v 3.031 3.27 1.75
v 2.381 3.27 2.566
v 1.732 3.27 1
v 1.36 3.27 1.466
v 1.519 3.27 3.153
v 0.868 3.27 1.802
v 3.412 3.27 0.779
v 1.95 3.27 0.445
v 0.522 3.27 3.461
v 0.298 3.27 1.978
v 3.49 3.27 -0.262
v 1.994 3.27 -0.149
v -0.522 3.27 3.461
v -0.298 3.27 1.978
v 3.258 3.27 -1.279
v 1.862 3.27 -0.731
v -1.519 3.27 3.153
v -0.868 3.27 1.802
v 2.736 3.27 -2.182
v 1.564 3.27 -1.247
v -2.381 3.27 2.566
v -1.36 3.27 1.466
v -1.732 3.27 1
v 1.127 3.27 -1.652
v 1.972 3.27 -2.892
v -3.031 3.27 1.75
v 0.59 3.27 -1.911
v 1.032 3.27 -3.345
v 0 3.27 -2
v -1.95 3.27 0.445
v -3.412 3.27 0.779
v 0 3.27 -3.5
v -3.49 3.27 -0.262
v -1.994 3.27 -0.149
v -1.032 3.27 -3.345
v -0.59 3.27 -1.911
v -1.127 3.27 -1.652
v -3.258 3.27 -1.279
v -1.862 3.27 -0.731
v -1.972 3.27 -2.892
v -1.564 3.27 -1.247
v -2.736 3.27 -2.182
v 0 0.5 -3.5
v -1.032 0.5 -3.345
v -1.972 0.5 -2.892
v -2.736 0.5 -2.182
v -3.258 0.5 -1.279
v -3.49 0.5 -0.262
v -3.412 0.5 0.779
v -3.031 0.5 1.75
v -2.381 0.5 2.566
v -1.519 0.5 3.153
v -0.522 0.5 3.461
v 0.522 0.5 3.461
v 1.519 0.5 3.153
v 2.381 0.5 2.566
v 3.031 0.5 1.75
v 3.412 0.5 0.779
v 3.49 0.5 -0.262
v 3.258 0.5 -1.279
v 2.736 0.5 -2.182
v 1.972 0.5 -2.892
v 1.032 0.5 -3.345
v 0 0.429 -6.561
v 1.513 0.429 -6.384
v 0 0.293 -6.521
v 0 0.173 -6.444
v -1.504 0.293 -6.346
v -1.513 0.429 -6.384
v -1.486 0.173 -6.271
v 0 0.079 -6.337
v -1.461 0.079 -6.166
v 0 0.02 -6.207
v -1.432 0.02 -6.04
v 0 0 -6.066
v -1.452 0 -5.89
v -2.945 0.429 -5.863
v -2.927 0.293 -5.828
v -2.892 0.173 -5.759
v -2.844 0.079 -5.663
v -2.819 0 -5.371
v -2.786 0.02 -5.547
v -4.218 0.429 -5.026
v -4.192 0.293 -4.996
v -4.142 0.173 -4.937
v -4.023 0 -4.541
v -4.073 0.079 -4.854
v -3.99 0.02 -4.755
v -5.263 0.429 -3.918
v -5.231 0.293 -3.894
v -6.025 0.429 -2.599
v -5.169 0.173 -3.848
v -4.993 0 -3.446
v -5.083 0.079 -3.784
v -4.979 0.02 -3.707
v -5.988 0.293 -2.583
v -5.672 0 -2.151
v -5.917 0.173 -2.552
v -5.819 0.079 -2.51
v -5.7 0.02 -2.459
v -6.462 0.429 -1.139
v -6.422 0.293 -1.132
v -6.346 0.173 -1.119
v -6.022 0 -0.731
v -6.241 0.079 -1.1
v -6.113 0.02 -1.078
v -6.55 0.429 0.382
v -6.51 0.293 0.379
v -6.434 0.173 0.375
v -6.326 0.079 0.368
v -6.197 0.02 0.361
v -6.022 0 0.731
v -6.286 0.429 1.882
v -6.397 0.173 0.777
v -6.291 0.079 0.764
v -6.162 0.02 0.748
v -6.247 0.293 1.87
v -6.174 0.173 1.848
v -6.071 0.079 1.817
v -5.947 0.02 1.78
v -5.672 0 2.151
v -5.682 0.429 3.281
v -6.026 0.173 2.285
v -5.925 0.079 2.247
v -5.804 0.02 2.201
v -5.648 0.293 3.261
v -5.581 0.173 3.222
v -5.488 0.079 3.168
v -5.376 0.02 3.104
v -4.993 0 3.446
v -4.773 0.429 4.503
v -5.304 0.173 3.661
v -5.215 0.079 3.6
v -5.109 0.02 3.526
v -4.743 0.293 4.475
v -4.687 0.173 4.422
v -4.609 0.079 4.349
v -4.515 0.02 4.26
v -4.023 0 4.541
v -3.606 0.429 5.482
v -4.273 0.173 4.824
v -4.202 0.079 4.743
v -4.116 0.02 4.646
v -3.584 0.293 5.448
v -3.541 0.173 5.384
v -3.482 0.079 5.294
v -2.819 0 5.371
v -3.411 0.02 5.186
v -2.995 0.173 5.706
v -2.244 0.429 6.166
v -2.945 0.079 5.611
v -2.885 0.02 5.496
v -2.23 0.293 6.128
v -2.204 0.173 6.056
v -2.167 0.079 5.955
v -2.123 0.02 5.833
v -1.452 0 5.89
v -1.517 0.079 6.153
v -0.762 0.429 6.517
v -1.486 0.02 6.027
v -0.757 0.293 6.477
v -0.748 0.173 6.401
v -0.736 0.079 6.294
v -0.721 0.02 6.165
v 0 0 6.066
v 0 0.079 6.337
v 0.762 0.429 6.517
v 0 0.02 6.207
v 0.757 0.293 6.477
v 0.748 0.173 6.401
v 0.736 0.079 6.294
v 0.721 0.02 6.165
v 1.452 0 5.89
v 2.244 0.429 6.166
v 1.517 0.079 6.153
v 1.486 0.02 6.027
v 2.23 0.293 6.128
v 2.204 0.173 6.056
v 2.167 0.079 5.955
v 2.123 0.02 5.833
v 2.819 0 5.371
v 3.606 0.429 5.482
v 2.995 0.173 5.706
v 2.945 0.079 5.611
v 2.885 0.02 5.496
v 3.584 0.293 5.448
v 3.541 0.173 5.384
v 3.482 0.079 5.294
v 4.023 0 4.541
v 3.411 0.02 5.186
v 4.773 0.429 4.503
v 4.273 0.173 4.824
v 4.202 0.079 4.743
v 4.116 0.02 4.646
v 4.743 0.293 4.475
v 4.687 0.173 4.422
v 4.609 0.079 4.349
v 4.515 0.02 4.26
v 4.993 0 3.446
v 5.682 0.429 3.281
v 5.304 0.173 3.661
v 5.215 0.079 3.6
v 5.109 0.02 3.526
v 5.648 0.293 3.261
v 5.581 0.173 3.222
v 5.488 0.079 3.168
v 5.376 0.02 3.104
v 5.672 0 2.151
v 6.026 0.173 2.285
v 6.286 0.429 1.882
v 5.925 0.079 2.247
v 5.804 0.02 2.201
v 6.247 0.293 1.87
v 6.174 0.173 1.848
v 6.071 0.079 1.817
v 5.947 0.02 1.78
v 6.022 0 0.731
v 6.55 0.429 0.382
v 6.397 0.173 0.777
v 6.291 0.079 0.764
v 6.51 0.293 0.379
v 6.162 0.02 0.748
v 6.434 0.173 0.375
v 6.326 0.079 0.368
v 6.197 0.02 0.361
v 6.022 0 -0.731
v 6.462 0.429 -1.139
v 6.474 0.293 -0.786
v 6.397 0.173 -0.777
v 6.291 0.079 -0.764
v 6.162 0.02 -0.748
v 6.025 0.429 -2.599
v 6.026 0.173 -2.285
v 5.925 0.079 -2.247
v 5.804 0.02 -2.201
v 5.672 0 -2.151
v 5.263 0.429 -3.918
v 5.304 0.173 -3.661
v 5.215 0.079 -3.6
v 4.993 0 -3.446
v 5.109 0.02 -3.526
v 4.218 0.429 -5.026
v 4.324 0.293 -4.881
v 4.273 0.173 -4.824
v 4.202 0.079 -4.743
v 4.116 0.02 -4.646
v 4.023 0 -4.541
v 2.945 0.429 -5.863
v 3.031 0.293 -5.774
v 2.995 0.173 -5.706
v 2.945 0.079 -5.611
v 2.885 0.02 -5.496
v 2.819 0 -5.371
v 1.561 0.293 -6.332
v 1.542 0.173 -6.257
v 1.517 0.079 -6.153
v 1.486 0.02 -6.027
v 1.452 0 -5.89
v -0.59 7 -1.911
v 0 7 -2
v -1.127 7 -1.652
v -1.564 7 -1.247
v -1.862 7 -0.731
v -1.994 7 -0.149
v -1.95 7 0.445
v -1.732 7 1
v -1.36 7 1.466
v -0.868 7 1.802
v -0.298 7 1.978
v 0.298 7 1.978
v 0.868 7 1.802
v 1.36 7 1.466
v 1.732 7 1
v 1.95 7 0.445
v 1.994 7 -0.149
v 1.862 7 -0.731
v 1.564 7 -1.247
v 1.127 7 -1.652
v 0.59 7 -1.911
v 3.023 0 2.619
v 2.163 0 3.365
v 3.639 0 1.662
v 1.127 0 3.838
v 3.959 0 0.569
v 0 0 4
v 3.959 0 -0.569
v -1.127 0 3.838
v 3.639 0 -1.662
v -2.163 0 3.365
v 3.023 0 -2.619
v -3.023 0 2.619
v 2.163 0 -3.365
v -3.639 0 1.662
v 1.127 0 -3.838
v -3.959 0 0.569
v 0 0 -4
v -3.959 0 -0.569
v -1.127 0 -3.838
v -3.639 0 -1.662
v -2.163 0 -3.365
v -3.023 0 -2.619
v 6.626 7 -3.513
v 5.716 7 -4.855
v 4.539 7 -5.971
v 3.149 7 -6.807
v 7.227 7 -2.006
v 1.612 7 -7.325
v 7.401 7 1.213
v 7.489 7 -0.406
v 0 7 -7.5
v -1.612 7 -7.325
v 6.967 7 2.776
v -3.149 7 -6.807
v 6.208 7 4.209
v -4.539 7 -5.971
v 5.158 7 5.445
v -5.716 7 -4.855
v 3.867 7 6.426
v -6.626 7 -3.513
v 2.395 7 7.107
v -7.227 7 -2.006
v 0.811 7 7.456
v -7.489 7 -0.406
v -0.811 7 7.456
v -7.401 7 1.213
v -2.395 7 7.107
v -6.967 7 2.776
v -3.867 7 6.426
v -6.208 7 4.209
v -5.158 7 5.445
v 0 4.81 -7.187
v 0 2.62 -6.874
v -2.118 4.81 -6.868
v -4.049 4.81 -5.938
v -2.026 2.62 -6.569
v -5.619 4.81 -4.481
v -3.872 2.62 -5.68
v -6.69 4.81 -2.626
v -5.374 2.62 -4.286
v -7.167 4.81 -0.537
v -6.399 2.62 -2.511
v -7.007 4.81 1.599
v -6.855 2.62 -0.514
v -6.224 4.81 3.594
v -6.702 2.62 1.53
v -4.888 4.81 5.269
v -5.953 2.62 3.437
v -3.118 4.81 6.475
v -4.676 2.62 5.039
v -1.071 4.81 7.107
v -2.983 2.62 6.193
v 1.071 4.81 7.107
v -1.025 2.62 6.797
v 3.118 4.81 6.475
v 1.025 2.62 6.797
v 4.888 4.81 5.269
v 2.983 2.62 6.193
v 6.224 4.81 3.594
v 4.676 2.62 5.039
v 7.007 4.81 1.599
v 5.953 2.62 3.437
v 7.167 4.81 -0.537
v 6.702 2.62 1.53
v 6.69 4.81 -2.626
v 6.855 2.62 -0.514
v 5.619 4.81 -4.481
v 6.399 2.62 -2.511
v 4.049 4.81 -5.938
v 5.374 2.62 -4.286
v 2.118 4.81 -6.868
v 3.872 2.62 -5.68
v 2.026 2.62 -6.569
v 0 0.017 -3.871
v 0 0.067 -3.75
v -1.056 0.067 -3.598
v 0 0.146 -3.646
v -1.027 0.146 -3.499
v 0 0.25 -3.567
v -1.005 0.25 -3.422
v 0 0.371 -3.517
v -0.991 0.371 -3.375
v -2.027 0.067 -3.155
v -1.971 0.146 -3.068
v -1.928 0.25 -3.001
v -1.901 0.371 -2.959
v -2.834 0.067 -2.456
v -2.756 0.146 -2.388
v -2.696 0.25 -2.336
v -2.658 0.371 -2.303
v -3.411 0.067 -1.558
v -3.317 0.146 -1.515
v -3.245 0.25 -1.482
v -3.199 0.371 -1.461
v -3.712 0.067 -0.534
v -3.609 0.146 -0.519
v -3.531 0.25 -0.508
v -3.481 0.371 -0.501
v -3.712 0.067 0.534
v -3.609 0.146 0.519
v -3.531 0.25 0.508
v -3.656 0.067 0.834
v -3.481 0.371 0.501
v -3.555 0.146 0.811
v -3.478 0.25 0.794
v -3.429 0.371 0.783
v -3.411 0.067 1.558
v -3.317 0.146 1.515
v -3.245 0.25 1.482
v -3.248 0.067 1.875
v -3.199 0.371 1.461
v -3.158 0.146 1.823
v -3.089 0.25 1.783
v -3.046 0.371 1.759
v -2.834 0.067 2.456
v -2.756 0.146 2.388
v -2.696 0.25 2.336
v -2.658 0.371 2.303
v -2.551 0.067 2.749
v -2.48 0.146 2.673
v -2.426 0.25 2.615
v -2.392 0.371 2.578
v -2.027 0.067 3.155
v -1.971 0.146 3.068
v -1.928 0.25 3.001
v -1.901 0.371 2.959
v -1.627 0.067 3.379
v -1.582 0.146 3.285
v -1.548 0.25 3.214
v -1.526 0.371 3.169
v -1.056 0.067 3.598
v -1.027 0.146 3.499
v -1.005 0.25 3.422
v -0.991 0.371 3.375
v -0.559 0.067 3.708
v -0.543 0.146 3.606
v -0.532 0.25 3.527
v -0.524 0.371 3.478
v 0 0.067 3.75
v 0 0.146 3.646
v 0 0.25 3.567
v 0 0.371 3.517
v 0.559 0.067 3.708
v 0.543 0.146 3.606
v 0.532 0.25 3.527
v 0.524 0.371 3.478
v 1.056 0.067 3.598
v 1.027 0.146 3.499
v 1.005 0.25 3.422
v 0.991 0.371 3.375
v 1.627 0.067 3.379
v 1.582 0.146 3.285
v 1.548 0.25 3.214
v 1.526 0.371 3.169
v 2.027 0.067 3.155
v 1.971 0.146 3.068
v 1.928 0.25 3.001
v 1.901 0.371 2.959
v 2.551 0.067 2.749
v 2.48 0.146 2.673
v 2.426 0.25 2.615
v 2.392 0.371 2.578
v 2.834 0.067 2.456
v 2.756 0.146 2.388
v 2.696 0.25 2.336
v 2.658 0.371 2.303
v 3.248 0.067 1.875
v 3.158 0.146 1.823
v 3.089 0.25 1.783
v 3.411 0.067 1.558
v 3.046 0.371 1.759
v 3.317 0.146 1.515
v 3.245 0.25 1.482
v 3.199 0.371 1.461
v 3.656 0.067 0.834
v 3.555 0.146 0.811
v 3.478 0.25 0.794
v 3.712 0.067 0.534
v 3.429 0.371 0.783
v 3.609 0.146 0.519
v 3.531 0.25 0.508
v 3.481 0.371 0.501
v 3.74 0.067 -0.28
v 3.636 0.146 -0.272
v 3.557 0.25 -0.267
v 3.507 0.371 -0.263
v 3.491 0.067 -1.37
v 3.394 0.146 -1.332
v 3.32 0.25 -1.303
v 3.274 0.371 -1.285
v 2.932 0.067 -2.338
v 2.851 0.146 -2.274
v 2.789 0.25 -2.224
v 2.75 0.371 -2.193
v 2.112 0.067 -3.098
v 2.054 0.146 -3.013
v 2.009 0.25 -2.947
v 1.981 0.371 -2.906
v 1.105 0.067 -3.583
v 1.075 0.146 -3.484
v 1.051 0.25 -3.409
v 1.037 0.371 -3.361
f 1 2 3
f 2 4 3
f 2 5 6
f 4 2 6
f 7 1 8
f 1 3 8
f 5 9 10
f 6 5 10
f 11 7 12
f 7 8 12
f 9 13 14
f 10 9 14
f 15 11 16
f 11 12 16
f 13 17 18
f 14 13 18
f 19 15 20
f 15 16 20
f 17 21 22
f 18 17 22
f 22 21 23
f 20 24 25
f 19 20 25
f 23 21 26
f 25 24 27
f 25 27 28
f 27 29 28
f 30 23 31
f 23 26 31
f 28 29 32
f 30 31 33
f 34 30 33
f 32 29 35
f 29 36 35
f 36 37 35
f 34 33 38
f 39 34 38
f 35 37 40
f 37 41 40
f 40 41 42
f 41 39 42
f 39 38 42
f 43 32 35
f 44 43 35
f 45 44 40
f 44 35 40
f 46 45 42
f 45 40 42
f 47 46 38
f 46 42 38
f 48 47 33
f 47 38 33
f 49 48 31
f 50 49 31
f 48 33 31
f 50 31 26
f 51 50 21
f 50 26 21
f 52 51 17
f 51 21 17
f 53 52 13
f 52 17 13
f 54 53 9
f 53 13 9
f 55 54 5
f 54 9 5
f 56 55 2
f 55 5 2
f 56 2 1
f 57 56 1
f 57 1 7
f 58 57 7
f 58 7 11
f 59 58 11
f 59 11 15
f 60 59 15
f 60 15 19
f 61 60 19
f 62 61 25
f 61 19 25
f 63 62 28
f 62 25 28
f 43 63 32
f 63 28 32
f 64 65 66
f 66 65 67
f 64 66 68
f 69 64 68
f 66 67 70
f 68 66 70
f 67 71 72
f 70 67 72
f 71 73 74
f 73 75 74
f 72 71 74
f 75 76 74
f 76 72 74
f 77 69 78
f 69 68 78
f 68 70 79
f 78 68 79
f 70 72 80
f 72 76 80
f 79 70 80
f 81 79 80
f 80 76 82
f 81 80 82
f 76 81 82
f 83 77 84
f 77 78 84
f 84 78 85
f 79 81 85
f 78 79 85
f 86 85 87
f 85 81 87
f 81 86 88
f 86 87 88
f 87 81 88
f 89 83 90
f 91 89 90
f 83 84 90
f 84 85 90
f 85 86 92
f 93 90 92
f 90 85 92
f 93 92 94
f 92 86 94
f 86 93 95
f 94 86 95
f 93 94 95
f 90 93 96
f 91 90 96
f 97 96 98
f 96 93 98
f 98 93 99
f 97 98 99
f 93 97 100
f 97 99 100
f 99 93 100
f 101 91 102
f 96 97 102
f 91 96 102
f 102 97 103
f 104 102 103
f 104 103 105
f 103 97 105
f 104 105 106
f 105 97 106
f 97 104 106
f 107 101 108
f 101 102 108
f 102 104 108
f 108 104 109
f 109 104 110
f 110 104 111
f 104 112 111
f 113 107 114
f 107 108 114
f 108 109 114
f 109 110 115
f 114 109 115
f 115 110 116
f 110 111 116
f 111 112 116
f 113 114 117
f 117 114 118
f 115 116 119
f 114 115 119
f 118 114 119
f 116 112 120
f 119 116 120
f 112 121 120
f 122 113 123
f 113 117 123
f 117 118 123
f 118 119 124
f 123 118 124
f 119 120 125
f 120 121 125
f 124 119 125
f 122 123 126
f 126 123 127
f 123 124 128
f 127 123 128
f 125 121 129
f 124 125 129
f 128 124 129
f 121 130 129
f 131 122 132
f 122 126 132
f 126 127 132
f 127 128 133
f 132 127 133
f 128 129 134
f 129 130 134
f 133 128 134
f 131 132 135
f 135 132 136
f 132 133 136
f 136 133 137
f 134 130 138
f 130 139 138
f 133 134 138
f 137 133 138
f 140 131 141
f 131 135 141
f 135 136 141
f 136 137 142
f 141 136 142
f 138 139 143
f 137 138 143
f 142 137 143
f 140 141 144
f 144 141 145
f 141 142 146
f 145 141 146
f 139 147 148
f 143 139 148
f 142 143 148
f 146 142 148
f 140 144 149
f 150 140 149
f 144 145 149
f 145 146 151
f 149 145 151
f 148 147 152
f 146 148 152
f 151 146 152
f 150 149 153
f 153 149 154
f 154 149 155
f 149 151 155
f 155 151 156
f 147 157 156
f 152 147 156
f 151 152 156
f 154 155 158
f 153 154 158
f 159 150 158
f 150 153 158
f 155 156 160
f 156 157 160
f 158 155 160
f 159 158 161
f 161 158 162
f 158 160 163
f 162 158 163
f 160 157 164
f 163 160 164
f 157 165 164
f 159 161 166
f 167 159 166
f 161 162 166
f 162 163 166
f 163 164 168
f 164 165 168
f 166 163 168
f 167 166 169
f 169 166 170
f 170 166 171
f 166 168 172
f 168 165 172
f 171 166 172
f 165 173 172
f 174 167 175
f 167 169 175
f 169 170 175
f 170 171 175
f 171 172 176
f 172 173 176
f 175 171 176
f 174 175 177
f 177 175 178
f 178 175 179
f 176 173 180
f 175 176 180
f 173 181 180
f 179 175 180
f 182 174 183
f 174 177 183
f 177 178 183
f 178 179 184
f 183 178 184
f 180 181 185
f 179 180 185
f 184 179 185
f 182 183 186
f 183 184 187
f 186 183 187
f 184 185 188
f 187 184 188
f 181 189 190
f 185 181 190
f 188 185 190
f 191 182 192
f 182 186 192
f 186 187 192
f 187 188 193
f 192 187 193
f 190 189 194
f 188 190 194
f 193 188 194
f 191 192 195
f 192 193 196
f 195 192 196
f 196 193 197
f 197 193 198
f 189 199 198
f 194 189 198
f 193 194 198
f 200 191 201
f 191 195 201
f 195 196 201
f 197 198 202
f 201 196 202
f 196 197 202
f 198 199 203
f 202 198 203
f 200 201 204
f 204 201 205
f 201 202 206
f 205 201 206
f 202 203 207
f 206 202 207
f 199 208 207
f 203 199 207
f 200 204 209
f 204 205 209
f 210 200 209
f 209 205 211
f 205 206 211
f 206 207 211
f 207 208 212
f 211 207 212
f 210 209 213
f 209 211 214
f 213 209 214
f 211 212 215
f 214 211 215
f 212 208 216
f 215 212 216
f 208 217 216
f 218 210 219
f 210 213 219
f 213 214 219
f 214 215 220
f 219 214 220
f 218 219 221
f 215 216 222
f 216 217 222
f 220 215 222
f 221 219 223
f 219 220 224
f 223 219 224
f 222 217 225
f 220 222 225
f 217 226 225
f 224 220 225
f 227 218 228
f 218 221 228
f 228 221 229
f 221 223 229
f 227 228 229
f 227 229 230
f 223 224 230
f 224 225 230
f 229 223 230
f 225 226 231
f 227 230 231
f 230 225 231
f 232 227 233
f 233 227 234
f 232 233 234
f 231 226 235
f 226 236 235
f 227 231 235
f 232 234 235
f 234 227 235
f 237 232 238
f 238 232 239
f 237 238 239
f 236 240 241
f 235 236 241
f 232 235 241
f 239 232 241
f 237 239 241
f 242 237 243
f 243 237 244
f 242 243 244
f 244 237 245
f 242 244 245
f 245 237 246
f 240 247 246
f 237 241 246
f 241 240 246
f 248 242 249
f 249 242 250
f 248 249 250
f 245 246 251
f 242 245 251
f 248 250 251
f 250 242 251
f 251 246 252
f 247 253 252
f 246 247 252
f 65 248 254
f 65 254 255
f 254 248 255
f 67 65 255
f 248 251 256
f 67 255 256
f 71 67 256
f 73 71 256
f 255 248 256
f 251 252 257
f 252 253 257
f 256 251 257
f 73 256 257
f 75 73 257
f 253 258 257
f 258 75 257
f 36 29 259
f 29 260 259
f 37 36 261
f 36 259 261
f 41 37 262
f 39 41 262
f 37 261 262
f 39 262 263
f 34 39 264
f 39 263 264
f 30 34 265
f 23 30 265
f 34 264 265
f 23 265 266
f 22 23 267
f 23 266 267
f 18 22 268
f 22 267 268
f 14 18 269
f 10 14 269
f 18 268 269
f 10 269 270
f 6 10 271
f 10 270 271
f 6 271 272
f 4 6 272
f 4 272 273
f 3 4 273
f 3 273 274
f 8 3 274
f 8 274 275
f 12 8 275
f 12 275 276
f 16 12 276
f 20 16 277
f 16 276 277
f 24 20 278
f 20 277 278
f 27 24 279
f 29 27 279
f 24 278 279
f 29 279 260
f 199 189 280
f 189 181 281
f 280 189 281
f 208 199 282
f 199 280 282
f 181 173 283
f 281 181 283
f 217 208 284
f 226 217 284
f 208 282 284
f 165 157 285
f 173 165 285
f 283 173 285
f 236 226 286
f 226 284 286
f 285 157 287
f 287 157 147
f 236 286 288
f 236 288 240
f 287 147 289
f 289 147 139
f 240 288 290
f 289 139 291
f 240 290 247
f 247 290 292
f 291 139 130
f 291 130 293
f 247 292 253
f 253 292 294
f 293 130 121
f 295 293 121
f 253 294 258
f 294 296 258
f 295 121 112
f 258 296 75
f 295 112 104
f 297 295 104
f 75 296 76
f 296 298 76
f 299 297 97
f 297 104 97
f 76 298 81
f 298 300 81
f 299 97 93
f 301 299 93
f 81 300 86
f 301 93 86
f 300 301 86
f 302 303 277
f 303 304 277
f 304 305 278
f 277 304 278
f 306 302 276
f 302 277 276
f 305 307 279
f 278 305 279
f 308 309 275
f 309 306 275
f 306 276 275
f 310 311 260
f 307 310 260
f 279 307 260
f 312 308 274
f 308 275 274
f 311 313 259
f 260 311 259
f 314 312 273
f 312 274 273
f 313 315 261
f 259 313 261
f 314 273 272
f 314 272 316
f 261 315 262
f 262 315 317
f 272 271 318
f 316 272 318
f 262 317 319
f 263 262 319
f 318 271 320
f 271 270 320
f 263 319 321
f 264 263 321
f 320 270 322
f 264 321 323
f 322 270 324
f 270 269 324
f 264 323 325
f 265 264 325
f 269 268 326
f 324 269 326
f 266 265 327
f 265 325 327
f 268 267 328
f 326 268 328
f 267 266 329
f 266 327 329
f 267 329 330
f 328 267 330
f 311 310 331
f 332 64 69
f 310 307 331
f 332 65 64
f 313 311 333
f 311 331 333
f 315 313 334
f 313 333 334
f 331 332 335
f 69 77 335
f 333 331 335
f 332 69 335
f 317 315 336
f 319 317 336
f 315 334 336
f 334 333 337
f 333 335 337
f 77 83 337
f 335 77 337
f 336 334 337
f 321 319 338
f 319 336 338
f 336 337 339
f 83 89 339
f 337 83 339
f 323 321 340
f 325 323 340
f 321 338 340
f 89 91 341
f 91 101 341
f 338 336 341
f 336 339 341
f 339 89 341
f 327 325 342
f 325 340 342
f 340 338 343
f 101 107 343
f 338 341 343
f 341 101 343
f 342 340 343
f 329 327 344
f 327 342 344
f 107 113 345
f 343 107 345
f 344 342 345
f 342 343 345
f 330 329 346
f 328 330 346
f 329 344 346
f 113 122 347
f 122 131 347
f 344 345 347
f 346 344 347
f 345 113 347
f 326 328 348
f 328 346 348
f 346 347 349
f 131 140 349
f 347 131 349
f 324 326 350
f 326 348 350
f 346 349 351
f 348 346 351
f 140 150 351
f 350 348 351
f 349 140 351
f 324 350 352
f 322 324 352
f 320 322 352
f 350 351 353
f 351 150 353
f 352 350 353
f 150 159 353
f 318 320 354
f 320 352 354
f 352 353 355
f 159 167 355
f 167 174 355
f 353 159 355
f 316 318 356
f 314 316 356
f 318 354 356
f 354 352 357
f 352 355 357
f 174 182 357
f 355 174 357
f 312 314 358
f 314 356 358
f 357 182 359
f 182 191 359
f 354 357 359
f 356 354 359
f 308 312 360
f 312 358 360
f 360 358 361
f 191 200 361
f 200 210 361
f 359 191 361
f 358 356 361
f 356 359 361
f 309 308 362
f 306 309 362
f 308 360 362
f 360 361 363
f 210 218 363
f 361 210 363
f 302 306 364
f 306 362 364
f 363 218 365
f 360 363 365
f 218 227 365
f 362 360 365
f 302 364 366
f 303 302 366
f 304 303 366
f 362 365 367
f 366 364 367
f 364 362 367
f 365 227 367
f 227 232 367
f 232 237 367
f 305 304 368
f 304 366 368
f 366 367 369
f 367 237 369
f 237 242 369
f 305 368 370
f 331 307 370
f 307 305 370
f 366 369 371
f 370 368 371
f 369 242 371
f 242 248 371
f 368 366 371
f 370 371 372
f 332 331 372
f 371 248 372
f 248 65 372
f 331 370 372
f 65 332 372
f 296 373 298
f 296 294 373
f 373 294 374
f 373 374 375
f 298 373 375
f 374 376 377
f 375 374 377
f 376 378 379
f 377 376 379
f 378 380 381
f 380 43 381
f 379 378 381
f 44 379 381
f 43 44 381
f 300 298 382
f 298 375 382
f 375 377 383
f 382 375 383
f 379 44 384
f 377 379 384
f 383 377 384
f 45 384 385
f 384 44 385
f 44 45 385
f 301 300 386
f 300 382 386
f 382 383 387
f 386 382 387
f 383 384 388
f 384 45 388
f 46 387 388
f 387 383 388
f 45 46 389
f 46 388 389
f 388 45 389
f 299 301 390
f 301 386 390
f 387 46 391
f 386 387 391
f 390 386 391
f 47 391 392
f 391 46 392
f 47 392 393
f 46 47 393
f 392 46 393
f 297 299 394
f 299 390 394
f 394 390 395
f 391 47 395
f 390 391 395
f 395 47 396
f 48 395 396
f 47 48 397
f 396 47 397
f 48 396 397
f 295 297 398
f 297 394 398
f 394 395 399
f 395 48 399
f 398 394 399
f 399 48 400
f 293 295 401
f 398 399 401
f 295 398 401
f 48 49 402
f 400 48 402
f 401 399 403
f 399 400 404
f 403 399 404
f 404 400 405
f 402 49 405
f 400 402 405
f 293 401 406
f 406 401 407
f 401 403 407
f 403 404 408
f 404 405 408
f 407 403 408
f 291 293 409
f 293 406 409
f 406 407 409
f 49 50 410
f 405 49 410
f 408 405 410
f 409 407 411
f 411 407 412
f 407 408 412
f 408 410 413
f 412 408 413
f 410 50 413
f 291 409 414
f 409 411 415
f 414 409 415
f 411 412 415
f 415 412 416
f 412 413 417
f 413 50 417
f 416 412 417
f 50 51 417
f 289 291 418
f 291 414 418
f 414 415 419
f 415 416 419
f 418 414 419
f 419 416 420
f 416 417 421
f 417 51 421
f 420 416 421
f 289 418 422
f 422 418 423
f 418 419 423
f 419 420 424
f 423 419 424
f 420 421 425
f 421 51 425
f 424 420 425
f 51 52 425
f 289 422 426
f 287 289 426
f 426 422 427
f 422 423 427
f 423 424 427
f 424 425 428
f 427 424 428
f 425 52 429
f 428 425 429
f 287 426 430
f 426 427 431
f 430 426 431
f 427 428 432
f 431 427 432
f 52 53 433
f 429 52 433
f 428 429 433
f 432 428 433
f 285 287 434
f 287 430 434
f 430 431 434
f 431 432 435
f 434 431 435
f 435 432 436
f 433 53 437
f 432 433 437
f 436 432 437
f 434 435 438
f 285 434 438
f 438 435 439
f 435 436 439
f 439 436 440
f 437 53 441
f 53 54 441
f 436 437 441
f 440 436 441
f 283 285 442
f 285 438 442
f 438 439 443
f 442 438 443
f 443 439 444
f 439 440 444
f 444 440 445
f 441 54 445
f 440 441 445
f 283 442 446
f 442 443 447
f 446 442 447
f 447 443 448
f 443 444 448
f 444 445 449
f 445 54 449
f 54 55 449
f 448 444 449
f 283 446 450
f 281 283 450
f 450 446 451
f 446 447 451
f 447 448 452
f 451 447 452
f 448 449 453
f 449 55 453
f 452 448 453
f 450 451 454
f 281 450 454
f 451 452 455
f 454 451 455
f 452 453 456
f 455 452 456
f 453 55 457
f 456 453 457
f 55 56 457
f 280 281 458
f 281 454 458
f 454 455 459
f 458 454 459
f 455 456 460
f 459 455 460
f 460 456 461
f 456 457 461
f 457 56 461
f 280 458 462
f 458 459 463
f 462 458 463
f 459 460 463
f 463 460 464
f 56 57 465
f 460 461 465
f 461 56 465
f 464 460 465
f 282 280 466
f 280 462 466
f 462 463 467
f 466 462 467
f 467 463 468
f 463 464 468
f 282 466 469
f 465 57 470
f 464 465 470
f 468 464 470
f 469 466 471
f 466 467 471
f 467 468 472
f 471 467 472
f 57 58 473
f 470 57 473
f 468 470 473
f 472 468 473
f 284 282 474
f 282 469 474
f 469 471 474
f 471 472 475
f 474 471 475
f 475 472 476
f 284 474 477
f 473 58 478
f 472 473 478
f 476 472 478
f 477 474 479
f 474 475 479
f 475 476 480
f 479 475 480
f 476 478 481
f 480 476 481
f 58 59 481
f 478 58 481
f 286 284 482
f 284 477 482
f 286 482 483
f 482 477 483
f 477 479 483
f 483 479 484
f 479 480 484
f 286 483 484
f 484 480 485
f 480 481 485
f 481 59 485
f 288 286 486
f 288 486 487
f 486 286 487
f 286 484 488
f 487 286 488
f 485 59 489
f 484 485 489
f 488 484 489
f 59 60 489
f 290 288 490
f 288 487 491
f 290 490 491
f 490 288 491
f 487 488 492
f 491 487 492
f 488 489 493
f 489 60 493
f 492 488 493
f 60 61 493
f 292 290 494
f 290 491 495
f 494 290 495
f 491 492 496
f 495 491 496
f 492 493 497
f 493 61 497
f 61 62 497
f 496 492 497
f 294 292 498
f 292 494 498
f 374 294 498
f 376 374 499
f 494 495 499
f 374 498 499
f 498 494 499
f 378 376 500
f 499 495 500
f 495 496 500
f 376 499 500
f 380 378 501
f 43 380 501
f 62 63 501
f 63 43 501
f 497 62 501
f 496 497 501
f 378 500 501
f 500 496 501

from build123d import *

# Parameters (mm, degrees)
FILLET_2_R = 0.5


with BuildPart() as part:
    # 草图1 → 旋转1 (revolve)
    with BuildSketch(Plane.XY, mode=Mode.PRIVATE) as revolve_1_sk:
        Polygon((2, 7), (7.5, 7), (6.5, 0), (3.5, 0), (3.5, 3.27), (2, 3.27), align=None)
    revolve(revolve_1_sk.sketch.rotate(Axis((0, 0, 0), (0, 1, 0)), 90), axis=Axis((0, 0, 0), (0, 1, 0)))

    # 圆角2
    fillet_2_edges = [part.edges().sort_by_distance(p)[0] for p in [
        (0, 0, 3.5),
        (0, 0, 6.5),
    ]]
    fillet(fillet_2_edges, radius=FILLET_2_R)


solid = part.part
